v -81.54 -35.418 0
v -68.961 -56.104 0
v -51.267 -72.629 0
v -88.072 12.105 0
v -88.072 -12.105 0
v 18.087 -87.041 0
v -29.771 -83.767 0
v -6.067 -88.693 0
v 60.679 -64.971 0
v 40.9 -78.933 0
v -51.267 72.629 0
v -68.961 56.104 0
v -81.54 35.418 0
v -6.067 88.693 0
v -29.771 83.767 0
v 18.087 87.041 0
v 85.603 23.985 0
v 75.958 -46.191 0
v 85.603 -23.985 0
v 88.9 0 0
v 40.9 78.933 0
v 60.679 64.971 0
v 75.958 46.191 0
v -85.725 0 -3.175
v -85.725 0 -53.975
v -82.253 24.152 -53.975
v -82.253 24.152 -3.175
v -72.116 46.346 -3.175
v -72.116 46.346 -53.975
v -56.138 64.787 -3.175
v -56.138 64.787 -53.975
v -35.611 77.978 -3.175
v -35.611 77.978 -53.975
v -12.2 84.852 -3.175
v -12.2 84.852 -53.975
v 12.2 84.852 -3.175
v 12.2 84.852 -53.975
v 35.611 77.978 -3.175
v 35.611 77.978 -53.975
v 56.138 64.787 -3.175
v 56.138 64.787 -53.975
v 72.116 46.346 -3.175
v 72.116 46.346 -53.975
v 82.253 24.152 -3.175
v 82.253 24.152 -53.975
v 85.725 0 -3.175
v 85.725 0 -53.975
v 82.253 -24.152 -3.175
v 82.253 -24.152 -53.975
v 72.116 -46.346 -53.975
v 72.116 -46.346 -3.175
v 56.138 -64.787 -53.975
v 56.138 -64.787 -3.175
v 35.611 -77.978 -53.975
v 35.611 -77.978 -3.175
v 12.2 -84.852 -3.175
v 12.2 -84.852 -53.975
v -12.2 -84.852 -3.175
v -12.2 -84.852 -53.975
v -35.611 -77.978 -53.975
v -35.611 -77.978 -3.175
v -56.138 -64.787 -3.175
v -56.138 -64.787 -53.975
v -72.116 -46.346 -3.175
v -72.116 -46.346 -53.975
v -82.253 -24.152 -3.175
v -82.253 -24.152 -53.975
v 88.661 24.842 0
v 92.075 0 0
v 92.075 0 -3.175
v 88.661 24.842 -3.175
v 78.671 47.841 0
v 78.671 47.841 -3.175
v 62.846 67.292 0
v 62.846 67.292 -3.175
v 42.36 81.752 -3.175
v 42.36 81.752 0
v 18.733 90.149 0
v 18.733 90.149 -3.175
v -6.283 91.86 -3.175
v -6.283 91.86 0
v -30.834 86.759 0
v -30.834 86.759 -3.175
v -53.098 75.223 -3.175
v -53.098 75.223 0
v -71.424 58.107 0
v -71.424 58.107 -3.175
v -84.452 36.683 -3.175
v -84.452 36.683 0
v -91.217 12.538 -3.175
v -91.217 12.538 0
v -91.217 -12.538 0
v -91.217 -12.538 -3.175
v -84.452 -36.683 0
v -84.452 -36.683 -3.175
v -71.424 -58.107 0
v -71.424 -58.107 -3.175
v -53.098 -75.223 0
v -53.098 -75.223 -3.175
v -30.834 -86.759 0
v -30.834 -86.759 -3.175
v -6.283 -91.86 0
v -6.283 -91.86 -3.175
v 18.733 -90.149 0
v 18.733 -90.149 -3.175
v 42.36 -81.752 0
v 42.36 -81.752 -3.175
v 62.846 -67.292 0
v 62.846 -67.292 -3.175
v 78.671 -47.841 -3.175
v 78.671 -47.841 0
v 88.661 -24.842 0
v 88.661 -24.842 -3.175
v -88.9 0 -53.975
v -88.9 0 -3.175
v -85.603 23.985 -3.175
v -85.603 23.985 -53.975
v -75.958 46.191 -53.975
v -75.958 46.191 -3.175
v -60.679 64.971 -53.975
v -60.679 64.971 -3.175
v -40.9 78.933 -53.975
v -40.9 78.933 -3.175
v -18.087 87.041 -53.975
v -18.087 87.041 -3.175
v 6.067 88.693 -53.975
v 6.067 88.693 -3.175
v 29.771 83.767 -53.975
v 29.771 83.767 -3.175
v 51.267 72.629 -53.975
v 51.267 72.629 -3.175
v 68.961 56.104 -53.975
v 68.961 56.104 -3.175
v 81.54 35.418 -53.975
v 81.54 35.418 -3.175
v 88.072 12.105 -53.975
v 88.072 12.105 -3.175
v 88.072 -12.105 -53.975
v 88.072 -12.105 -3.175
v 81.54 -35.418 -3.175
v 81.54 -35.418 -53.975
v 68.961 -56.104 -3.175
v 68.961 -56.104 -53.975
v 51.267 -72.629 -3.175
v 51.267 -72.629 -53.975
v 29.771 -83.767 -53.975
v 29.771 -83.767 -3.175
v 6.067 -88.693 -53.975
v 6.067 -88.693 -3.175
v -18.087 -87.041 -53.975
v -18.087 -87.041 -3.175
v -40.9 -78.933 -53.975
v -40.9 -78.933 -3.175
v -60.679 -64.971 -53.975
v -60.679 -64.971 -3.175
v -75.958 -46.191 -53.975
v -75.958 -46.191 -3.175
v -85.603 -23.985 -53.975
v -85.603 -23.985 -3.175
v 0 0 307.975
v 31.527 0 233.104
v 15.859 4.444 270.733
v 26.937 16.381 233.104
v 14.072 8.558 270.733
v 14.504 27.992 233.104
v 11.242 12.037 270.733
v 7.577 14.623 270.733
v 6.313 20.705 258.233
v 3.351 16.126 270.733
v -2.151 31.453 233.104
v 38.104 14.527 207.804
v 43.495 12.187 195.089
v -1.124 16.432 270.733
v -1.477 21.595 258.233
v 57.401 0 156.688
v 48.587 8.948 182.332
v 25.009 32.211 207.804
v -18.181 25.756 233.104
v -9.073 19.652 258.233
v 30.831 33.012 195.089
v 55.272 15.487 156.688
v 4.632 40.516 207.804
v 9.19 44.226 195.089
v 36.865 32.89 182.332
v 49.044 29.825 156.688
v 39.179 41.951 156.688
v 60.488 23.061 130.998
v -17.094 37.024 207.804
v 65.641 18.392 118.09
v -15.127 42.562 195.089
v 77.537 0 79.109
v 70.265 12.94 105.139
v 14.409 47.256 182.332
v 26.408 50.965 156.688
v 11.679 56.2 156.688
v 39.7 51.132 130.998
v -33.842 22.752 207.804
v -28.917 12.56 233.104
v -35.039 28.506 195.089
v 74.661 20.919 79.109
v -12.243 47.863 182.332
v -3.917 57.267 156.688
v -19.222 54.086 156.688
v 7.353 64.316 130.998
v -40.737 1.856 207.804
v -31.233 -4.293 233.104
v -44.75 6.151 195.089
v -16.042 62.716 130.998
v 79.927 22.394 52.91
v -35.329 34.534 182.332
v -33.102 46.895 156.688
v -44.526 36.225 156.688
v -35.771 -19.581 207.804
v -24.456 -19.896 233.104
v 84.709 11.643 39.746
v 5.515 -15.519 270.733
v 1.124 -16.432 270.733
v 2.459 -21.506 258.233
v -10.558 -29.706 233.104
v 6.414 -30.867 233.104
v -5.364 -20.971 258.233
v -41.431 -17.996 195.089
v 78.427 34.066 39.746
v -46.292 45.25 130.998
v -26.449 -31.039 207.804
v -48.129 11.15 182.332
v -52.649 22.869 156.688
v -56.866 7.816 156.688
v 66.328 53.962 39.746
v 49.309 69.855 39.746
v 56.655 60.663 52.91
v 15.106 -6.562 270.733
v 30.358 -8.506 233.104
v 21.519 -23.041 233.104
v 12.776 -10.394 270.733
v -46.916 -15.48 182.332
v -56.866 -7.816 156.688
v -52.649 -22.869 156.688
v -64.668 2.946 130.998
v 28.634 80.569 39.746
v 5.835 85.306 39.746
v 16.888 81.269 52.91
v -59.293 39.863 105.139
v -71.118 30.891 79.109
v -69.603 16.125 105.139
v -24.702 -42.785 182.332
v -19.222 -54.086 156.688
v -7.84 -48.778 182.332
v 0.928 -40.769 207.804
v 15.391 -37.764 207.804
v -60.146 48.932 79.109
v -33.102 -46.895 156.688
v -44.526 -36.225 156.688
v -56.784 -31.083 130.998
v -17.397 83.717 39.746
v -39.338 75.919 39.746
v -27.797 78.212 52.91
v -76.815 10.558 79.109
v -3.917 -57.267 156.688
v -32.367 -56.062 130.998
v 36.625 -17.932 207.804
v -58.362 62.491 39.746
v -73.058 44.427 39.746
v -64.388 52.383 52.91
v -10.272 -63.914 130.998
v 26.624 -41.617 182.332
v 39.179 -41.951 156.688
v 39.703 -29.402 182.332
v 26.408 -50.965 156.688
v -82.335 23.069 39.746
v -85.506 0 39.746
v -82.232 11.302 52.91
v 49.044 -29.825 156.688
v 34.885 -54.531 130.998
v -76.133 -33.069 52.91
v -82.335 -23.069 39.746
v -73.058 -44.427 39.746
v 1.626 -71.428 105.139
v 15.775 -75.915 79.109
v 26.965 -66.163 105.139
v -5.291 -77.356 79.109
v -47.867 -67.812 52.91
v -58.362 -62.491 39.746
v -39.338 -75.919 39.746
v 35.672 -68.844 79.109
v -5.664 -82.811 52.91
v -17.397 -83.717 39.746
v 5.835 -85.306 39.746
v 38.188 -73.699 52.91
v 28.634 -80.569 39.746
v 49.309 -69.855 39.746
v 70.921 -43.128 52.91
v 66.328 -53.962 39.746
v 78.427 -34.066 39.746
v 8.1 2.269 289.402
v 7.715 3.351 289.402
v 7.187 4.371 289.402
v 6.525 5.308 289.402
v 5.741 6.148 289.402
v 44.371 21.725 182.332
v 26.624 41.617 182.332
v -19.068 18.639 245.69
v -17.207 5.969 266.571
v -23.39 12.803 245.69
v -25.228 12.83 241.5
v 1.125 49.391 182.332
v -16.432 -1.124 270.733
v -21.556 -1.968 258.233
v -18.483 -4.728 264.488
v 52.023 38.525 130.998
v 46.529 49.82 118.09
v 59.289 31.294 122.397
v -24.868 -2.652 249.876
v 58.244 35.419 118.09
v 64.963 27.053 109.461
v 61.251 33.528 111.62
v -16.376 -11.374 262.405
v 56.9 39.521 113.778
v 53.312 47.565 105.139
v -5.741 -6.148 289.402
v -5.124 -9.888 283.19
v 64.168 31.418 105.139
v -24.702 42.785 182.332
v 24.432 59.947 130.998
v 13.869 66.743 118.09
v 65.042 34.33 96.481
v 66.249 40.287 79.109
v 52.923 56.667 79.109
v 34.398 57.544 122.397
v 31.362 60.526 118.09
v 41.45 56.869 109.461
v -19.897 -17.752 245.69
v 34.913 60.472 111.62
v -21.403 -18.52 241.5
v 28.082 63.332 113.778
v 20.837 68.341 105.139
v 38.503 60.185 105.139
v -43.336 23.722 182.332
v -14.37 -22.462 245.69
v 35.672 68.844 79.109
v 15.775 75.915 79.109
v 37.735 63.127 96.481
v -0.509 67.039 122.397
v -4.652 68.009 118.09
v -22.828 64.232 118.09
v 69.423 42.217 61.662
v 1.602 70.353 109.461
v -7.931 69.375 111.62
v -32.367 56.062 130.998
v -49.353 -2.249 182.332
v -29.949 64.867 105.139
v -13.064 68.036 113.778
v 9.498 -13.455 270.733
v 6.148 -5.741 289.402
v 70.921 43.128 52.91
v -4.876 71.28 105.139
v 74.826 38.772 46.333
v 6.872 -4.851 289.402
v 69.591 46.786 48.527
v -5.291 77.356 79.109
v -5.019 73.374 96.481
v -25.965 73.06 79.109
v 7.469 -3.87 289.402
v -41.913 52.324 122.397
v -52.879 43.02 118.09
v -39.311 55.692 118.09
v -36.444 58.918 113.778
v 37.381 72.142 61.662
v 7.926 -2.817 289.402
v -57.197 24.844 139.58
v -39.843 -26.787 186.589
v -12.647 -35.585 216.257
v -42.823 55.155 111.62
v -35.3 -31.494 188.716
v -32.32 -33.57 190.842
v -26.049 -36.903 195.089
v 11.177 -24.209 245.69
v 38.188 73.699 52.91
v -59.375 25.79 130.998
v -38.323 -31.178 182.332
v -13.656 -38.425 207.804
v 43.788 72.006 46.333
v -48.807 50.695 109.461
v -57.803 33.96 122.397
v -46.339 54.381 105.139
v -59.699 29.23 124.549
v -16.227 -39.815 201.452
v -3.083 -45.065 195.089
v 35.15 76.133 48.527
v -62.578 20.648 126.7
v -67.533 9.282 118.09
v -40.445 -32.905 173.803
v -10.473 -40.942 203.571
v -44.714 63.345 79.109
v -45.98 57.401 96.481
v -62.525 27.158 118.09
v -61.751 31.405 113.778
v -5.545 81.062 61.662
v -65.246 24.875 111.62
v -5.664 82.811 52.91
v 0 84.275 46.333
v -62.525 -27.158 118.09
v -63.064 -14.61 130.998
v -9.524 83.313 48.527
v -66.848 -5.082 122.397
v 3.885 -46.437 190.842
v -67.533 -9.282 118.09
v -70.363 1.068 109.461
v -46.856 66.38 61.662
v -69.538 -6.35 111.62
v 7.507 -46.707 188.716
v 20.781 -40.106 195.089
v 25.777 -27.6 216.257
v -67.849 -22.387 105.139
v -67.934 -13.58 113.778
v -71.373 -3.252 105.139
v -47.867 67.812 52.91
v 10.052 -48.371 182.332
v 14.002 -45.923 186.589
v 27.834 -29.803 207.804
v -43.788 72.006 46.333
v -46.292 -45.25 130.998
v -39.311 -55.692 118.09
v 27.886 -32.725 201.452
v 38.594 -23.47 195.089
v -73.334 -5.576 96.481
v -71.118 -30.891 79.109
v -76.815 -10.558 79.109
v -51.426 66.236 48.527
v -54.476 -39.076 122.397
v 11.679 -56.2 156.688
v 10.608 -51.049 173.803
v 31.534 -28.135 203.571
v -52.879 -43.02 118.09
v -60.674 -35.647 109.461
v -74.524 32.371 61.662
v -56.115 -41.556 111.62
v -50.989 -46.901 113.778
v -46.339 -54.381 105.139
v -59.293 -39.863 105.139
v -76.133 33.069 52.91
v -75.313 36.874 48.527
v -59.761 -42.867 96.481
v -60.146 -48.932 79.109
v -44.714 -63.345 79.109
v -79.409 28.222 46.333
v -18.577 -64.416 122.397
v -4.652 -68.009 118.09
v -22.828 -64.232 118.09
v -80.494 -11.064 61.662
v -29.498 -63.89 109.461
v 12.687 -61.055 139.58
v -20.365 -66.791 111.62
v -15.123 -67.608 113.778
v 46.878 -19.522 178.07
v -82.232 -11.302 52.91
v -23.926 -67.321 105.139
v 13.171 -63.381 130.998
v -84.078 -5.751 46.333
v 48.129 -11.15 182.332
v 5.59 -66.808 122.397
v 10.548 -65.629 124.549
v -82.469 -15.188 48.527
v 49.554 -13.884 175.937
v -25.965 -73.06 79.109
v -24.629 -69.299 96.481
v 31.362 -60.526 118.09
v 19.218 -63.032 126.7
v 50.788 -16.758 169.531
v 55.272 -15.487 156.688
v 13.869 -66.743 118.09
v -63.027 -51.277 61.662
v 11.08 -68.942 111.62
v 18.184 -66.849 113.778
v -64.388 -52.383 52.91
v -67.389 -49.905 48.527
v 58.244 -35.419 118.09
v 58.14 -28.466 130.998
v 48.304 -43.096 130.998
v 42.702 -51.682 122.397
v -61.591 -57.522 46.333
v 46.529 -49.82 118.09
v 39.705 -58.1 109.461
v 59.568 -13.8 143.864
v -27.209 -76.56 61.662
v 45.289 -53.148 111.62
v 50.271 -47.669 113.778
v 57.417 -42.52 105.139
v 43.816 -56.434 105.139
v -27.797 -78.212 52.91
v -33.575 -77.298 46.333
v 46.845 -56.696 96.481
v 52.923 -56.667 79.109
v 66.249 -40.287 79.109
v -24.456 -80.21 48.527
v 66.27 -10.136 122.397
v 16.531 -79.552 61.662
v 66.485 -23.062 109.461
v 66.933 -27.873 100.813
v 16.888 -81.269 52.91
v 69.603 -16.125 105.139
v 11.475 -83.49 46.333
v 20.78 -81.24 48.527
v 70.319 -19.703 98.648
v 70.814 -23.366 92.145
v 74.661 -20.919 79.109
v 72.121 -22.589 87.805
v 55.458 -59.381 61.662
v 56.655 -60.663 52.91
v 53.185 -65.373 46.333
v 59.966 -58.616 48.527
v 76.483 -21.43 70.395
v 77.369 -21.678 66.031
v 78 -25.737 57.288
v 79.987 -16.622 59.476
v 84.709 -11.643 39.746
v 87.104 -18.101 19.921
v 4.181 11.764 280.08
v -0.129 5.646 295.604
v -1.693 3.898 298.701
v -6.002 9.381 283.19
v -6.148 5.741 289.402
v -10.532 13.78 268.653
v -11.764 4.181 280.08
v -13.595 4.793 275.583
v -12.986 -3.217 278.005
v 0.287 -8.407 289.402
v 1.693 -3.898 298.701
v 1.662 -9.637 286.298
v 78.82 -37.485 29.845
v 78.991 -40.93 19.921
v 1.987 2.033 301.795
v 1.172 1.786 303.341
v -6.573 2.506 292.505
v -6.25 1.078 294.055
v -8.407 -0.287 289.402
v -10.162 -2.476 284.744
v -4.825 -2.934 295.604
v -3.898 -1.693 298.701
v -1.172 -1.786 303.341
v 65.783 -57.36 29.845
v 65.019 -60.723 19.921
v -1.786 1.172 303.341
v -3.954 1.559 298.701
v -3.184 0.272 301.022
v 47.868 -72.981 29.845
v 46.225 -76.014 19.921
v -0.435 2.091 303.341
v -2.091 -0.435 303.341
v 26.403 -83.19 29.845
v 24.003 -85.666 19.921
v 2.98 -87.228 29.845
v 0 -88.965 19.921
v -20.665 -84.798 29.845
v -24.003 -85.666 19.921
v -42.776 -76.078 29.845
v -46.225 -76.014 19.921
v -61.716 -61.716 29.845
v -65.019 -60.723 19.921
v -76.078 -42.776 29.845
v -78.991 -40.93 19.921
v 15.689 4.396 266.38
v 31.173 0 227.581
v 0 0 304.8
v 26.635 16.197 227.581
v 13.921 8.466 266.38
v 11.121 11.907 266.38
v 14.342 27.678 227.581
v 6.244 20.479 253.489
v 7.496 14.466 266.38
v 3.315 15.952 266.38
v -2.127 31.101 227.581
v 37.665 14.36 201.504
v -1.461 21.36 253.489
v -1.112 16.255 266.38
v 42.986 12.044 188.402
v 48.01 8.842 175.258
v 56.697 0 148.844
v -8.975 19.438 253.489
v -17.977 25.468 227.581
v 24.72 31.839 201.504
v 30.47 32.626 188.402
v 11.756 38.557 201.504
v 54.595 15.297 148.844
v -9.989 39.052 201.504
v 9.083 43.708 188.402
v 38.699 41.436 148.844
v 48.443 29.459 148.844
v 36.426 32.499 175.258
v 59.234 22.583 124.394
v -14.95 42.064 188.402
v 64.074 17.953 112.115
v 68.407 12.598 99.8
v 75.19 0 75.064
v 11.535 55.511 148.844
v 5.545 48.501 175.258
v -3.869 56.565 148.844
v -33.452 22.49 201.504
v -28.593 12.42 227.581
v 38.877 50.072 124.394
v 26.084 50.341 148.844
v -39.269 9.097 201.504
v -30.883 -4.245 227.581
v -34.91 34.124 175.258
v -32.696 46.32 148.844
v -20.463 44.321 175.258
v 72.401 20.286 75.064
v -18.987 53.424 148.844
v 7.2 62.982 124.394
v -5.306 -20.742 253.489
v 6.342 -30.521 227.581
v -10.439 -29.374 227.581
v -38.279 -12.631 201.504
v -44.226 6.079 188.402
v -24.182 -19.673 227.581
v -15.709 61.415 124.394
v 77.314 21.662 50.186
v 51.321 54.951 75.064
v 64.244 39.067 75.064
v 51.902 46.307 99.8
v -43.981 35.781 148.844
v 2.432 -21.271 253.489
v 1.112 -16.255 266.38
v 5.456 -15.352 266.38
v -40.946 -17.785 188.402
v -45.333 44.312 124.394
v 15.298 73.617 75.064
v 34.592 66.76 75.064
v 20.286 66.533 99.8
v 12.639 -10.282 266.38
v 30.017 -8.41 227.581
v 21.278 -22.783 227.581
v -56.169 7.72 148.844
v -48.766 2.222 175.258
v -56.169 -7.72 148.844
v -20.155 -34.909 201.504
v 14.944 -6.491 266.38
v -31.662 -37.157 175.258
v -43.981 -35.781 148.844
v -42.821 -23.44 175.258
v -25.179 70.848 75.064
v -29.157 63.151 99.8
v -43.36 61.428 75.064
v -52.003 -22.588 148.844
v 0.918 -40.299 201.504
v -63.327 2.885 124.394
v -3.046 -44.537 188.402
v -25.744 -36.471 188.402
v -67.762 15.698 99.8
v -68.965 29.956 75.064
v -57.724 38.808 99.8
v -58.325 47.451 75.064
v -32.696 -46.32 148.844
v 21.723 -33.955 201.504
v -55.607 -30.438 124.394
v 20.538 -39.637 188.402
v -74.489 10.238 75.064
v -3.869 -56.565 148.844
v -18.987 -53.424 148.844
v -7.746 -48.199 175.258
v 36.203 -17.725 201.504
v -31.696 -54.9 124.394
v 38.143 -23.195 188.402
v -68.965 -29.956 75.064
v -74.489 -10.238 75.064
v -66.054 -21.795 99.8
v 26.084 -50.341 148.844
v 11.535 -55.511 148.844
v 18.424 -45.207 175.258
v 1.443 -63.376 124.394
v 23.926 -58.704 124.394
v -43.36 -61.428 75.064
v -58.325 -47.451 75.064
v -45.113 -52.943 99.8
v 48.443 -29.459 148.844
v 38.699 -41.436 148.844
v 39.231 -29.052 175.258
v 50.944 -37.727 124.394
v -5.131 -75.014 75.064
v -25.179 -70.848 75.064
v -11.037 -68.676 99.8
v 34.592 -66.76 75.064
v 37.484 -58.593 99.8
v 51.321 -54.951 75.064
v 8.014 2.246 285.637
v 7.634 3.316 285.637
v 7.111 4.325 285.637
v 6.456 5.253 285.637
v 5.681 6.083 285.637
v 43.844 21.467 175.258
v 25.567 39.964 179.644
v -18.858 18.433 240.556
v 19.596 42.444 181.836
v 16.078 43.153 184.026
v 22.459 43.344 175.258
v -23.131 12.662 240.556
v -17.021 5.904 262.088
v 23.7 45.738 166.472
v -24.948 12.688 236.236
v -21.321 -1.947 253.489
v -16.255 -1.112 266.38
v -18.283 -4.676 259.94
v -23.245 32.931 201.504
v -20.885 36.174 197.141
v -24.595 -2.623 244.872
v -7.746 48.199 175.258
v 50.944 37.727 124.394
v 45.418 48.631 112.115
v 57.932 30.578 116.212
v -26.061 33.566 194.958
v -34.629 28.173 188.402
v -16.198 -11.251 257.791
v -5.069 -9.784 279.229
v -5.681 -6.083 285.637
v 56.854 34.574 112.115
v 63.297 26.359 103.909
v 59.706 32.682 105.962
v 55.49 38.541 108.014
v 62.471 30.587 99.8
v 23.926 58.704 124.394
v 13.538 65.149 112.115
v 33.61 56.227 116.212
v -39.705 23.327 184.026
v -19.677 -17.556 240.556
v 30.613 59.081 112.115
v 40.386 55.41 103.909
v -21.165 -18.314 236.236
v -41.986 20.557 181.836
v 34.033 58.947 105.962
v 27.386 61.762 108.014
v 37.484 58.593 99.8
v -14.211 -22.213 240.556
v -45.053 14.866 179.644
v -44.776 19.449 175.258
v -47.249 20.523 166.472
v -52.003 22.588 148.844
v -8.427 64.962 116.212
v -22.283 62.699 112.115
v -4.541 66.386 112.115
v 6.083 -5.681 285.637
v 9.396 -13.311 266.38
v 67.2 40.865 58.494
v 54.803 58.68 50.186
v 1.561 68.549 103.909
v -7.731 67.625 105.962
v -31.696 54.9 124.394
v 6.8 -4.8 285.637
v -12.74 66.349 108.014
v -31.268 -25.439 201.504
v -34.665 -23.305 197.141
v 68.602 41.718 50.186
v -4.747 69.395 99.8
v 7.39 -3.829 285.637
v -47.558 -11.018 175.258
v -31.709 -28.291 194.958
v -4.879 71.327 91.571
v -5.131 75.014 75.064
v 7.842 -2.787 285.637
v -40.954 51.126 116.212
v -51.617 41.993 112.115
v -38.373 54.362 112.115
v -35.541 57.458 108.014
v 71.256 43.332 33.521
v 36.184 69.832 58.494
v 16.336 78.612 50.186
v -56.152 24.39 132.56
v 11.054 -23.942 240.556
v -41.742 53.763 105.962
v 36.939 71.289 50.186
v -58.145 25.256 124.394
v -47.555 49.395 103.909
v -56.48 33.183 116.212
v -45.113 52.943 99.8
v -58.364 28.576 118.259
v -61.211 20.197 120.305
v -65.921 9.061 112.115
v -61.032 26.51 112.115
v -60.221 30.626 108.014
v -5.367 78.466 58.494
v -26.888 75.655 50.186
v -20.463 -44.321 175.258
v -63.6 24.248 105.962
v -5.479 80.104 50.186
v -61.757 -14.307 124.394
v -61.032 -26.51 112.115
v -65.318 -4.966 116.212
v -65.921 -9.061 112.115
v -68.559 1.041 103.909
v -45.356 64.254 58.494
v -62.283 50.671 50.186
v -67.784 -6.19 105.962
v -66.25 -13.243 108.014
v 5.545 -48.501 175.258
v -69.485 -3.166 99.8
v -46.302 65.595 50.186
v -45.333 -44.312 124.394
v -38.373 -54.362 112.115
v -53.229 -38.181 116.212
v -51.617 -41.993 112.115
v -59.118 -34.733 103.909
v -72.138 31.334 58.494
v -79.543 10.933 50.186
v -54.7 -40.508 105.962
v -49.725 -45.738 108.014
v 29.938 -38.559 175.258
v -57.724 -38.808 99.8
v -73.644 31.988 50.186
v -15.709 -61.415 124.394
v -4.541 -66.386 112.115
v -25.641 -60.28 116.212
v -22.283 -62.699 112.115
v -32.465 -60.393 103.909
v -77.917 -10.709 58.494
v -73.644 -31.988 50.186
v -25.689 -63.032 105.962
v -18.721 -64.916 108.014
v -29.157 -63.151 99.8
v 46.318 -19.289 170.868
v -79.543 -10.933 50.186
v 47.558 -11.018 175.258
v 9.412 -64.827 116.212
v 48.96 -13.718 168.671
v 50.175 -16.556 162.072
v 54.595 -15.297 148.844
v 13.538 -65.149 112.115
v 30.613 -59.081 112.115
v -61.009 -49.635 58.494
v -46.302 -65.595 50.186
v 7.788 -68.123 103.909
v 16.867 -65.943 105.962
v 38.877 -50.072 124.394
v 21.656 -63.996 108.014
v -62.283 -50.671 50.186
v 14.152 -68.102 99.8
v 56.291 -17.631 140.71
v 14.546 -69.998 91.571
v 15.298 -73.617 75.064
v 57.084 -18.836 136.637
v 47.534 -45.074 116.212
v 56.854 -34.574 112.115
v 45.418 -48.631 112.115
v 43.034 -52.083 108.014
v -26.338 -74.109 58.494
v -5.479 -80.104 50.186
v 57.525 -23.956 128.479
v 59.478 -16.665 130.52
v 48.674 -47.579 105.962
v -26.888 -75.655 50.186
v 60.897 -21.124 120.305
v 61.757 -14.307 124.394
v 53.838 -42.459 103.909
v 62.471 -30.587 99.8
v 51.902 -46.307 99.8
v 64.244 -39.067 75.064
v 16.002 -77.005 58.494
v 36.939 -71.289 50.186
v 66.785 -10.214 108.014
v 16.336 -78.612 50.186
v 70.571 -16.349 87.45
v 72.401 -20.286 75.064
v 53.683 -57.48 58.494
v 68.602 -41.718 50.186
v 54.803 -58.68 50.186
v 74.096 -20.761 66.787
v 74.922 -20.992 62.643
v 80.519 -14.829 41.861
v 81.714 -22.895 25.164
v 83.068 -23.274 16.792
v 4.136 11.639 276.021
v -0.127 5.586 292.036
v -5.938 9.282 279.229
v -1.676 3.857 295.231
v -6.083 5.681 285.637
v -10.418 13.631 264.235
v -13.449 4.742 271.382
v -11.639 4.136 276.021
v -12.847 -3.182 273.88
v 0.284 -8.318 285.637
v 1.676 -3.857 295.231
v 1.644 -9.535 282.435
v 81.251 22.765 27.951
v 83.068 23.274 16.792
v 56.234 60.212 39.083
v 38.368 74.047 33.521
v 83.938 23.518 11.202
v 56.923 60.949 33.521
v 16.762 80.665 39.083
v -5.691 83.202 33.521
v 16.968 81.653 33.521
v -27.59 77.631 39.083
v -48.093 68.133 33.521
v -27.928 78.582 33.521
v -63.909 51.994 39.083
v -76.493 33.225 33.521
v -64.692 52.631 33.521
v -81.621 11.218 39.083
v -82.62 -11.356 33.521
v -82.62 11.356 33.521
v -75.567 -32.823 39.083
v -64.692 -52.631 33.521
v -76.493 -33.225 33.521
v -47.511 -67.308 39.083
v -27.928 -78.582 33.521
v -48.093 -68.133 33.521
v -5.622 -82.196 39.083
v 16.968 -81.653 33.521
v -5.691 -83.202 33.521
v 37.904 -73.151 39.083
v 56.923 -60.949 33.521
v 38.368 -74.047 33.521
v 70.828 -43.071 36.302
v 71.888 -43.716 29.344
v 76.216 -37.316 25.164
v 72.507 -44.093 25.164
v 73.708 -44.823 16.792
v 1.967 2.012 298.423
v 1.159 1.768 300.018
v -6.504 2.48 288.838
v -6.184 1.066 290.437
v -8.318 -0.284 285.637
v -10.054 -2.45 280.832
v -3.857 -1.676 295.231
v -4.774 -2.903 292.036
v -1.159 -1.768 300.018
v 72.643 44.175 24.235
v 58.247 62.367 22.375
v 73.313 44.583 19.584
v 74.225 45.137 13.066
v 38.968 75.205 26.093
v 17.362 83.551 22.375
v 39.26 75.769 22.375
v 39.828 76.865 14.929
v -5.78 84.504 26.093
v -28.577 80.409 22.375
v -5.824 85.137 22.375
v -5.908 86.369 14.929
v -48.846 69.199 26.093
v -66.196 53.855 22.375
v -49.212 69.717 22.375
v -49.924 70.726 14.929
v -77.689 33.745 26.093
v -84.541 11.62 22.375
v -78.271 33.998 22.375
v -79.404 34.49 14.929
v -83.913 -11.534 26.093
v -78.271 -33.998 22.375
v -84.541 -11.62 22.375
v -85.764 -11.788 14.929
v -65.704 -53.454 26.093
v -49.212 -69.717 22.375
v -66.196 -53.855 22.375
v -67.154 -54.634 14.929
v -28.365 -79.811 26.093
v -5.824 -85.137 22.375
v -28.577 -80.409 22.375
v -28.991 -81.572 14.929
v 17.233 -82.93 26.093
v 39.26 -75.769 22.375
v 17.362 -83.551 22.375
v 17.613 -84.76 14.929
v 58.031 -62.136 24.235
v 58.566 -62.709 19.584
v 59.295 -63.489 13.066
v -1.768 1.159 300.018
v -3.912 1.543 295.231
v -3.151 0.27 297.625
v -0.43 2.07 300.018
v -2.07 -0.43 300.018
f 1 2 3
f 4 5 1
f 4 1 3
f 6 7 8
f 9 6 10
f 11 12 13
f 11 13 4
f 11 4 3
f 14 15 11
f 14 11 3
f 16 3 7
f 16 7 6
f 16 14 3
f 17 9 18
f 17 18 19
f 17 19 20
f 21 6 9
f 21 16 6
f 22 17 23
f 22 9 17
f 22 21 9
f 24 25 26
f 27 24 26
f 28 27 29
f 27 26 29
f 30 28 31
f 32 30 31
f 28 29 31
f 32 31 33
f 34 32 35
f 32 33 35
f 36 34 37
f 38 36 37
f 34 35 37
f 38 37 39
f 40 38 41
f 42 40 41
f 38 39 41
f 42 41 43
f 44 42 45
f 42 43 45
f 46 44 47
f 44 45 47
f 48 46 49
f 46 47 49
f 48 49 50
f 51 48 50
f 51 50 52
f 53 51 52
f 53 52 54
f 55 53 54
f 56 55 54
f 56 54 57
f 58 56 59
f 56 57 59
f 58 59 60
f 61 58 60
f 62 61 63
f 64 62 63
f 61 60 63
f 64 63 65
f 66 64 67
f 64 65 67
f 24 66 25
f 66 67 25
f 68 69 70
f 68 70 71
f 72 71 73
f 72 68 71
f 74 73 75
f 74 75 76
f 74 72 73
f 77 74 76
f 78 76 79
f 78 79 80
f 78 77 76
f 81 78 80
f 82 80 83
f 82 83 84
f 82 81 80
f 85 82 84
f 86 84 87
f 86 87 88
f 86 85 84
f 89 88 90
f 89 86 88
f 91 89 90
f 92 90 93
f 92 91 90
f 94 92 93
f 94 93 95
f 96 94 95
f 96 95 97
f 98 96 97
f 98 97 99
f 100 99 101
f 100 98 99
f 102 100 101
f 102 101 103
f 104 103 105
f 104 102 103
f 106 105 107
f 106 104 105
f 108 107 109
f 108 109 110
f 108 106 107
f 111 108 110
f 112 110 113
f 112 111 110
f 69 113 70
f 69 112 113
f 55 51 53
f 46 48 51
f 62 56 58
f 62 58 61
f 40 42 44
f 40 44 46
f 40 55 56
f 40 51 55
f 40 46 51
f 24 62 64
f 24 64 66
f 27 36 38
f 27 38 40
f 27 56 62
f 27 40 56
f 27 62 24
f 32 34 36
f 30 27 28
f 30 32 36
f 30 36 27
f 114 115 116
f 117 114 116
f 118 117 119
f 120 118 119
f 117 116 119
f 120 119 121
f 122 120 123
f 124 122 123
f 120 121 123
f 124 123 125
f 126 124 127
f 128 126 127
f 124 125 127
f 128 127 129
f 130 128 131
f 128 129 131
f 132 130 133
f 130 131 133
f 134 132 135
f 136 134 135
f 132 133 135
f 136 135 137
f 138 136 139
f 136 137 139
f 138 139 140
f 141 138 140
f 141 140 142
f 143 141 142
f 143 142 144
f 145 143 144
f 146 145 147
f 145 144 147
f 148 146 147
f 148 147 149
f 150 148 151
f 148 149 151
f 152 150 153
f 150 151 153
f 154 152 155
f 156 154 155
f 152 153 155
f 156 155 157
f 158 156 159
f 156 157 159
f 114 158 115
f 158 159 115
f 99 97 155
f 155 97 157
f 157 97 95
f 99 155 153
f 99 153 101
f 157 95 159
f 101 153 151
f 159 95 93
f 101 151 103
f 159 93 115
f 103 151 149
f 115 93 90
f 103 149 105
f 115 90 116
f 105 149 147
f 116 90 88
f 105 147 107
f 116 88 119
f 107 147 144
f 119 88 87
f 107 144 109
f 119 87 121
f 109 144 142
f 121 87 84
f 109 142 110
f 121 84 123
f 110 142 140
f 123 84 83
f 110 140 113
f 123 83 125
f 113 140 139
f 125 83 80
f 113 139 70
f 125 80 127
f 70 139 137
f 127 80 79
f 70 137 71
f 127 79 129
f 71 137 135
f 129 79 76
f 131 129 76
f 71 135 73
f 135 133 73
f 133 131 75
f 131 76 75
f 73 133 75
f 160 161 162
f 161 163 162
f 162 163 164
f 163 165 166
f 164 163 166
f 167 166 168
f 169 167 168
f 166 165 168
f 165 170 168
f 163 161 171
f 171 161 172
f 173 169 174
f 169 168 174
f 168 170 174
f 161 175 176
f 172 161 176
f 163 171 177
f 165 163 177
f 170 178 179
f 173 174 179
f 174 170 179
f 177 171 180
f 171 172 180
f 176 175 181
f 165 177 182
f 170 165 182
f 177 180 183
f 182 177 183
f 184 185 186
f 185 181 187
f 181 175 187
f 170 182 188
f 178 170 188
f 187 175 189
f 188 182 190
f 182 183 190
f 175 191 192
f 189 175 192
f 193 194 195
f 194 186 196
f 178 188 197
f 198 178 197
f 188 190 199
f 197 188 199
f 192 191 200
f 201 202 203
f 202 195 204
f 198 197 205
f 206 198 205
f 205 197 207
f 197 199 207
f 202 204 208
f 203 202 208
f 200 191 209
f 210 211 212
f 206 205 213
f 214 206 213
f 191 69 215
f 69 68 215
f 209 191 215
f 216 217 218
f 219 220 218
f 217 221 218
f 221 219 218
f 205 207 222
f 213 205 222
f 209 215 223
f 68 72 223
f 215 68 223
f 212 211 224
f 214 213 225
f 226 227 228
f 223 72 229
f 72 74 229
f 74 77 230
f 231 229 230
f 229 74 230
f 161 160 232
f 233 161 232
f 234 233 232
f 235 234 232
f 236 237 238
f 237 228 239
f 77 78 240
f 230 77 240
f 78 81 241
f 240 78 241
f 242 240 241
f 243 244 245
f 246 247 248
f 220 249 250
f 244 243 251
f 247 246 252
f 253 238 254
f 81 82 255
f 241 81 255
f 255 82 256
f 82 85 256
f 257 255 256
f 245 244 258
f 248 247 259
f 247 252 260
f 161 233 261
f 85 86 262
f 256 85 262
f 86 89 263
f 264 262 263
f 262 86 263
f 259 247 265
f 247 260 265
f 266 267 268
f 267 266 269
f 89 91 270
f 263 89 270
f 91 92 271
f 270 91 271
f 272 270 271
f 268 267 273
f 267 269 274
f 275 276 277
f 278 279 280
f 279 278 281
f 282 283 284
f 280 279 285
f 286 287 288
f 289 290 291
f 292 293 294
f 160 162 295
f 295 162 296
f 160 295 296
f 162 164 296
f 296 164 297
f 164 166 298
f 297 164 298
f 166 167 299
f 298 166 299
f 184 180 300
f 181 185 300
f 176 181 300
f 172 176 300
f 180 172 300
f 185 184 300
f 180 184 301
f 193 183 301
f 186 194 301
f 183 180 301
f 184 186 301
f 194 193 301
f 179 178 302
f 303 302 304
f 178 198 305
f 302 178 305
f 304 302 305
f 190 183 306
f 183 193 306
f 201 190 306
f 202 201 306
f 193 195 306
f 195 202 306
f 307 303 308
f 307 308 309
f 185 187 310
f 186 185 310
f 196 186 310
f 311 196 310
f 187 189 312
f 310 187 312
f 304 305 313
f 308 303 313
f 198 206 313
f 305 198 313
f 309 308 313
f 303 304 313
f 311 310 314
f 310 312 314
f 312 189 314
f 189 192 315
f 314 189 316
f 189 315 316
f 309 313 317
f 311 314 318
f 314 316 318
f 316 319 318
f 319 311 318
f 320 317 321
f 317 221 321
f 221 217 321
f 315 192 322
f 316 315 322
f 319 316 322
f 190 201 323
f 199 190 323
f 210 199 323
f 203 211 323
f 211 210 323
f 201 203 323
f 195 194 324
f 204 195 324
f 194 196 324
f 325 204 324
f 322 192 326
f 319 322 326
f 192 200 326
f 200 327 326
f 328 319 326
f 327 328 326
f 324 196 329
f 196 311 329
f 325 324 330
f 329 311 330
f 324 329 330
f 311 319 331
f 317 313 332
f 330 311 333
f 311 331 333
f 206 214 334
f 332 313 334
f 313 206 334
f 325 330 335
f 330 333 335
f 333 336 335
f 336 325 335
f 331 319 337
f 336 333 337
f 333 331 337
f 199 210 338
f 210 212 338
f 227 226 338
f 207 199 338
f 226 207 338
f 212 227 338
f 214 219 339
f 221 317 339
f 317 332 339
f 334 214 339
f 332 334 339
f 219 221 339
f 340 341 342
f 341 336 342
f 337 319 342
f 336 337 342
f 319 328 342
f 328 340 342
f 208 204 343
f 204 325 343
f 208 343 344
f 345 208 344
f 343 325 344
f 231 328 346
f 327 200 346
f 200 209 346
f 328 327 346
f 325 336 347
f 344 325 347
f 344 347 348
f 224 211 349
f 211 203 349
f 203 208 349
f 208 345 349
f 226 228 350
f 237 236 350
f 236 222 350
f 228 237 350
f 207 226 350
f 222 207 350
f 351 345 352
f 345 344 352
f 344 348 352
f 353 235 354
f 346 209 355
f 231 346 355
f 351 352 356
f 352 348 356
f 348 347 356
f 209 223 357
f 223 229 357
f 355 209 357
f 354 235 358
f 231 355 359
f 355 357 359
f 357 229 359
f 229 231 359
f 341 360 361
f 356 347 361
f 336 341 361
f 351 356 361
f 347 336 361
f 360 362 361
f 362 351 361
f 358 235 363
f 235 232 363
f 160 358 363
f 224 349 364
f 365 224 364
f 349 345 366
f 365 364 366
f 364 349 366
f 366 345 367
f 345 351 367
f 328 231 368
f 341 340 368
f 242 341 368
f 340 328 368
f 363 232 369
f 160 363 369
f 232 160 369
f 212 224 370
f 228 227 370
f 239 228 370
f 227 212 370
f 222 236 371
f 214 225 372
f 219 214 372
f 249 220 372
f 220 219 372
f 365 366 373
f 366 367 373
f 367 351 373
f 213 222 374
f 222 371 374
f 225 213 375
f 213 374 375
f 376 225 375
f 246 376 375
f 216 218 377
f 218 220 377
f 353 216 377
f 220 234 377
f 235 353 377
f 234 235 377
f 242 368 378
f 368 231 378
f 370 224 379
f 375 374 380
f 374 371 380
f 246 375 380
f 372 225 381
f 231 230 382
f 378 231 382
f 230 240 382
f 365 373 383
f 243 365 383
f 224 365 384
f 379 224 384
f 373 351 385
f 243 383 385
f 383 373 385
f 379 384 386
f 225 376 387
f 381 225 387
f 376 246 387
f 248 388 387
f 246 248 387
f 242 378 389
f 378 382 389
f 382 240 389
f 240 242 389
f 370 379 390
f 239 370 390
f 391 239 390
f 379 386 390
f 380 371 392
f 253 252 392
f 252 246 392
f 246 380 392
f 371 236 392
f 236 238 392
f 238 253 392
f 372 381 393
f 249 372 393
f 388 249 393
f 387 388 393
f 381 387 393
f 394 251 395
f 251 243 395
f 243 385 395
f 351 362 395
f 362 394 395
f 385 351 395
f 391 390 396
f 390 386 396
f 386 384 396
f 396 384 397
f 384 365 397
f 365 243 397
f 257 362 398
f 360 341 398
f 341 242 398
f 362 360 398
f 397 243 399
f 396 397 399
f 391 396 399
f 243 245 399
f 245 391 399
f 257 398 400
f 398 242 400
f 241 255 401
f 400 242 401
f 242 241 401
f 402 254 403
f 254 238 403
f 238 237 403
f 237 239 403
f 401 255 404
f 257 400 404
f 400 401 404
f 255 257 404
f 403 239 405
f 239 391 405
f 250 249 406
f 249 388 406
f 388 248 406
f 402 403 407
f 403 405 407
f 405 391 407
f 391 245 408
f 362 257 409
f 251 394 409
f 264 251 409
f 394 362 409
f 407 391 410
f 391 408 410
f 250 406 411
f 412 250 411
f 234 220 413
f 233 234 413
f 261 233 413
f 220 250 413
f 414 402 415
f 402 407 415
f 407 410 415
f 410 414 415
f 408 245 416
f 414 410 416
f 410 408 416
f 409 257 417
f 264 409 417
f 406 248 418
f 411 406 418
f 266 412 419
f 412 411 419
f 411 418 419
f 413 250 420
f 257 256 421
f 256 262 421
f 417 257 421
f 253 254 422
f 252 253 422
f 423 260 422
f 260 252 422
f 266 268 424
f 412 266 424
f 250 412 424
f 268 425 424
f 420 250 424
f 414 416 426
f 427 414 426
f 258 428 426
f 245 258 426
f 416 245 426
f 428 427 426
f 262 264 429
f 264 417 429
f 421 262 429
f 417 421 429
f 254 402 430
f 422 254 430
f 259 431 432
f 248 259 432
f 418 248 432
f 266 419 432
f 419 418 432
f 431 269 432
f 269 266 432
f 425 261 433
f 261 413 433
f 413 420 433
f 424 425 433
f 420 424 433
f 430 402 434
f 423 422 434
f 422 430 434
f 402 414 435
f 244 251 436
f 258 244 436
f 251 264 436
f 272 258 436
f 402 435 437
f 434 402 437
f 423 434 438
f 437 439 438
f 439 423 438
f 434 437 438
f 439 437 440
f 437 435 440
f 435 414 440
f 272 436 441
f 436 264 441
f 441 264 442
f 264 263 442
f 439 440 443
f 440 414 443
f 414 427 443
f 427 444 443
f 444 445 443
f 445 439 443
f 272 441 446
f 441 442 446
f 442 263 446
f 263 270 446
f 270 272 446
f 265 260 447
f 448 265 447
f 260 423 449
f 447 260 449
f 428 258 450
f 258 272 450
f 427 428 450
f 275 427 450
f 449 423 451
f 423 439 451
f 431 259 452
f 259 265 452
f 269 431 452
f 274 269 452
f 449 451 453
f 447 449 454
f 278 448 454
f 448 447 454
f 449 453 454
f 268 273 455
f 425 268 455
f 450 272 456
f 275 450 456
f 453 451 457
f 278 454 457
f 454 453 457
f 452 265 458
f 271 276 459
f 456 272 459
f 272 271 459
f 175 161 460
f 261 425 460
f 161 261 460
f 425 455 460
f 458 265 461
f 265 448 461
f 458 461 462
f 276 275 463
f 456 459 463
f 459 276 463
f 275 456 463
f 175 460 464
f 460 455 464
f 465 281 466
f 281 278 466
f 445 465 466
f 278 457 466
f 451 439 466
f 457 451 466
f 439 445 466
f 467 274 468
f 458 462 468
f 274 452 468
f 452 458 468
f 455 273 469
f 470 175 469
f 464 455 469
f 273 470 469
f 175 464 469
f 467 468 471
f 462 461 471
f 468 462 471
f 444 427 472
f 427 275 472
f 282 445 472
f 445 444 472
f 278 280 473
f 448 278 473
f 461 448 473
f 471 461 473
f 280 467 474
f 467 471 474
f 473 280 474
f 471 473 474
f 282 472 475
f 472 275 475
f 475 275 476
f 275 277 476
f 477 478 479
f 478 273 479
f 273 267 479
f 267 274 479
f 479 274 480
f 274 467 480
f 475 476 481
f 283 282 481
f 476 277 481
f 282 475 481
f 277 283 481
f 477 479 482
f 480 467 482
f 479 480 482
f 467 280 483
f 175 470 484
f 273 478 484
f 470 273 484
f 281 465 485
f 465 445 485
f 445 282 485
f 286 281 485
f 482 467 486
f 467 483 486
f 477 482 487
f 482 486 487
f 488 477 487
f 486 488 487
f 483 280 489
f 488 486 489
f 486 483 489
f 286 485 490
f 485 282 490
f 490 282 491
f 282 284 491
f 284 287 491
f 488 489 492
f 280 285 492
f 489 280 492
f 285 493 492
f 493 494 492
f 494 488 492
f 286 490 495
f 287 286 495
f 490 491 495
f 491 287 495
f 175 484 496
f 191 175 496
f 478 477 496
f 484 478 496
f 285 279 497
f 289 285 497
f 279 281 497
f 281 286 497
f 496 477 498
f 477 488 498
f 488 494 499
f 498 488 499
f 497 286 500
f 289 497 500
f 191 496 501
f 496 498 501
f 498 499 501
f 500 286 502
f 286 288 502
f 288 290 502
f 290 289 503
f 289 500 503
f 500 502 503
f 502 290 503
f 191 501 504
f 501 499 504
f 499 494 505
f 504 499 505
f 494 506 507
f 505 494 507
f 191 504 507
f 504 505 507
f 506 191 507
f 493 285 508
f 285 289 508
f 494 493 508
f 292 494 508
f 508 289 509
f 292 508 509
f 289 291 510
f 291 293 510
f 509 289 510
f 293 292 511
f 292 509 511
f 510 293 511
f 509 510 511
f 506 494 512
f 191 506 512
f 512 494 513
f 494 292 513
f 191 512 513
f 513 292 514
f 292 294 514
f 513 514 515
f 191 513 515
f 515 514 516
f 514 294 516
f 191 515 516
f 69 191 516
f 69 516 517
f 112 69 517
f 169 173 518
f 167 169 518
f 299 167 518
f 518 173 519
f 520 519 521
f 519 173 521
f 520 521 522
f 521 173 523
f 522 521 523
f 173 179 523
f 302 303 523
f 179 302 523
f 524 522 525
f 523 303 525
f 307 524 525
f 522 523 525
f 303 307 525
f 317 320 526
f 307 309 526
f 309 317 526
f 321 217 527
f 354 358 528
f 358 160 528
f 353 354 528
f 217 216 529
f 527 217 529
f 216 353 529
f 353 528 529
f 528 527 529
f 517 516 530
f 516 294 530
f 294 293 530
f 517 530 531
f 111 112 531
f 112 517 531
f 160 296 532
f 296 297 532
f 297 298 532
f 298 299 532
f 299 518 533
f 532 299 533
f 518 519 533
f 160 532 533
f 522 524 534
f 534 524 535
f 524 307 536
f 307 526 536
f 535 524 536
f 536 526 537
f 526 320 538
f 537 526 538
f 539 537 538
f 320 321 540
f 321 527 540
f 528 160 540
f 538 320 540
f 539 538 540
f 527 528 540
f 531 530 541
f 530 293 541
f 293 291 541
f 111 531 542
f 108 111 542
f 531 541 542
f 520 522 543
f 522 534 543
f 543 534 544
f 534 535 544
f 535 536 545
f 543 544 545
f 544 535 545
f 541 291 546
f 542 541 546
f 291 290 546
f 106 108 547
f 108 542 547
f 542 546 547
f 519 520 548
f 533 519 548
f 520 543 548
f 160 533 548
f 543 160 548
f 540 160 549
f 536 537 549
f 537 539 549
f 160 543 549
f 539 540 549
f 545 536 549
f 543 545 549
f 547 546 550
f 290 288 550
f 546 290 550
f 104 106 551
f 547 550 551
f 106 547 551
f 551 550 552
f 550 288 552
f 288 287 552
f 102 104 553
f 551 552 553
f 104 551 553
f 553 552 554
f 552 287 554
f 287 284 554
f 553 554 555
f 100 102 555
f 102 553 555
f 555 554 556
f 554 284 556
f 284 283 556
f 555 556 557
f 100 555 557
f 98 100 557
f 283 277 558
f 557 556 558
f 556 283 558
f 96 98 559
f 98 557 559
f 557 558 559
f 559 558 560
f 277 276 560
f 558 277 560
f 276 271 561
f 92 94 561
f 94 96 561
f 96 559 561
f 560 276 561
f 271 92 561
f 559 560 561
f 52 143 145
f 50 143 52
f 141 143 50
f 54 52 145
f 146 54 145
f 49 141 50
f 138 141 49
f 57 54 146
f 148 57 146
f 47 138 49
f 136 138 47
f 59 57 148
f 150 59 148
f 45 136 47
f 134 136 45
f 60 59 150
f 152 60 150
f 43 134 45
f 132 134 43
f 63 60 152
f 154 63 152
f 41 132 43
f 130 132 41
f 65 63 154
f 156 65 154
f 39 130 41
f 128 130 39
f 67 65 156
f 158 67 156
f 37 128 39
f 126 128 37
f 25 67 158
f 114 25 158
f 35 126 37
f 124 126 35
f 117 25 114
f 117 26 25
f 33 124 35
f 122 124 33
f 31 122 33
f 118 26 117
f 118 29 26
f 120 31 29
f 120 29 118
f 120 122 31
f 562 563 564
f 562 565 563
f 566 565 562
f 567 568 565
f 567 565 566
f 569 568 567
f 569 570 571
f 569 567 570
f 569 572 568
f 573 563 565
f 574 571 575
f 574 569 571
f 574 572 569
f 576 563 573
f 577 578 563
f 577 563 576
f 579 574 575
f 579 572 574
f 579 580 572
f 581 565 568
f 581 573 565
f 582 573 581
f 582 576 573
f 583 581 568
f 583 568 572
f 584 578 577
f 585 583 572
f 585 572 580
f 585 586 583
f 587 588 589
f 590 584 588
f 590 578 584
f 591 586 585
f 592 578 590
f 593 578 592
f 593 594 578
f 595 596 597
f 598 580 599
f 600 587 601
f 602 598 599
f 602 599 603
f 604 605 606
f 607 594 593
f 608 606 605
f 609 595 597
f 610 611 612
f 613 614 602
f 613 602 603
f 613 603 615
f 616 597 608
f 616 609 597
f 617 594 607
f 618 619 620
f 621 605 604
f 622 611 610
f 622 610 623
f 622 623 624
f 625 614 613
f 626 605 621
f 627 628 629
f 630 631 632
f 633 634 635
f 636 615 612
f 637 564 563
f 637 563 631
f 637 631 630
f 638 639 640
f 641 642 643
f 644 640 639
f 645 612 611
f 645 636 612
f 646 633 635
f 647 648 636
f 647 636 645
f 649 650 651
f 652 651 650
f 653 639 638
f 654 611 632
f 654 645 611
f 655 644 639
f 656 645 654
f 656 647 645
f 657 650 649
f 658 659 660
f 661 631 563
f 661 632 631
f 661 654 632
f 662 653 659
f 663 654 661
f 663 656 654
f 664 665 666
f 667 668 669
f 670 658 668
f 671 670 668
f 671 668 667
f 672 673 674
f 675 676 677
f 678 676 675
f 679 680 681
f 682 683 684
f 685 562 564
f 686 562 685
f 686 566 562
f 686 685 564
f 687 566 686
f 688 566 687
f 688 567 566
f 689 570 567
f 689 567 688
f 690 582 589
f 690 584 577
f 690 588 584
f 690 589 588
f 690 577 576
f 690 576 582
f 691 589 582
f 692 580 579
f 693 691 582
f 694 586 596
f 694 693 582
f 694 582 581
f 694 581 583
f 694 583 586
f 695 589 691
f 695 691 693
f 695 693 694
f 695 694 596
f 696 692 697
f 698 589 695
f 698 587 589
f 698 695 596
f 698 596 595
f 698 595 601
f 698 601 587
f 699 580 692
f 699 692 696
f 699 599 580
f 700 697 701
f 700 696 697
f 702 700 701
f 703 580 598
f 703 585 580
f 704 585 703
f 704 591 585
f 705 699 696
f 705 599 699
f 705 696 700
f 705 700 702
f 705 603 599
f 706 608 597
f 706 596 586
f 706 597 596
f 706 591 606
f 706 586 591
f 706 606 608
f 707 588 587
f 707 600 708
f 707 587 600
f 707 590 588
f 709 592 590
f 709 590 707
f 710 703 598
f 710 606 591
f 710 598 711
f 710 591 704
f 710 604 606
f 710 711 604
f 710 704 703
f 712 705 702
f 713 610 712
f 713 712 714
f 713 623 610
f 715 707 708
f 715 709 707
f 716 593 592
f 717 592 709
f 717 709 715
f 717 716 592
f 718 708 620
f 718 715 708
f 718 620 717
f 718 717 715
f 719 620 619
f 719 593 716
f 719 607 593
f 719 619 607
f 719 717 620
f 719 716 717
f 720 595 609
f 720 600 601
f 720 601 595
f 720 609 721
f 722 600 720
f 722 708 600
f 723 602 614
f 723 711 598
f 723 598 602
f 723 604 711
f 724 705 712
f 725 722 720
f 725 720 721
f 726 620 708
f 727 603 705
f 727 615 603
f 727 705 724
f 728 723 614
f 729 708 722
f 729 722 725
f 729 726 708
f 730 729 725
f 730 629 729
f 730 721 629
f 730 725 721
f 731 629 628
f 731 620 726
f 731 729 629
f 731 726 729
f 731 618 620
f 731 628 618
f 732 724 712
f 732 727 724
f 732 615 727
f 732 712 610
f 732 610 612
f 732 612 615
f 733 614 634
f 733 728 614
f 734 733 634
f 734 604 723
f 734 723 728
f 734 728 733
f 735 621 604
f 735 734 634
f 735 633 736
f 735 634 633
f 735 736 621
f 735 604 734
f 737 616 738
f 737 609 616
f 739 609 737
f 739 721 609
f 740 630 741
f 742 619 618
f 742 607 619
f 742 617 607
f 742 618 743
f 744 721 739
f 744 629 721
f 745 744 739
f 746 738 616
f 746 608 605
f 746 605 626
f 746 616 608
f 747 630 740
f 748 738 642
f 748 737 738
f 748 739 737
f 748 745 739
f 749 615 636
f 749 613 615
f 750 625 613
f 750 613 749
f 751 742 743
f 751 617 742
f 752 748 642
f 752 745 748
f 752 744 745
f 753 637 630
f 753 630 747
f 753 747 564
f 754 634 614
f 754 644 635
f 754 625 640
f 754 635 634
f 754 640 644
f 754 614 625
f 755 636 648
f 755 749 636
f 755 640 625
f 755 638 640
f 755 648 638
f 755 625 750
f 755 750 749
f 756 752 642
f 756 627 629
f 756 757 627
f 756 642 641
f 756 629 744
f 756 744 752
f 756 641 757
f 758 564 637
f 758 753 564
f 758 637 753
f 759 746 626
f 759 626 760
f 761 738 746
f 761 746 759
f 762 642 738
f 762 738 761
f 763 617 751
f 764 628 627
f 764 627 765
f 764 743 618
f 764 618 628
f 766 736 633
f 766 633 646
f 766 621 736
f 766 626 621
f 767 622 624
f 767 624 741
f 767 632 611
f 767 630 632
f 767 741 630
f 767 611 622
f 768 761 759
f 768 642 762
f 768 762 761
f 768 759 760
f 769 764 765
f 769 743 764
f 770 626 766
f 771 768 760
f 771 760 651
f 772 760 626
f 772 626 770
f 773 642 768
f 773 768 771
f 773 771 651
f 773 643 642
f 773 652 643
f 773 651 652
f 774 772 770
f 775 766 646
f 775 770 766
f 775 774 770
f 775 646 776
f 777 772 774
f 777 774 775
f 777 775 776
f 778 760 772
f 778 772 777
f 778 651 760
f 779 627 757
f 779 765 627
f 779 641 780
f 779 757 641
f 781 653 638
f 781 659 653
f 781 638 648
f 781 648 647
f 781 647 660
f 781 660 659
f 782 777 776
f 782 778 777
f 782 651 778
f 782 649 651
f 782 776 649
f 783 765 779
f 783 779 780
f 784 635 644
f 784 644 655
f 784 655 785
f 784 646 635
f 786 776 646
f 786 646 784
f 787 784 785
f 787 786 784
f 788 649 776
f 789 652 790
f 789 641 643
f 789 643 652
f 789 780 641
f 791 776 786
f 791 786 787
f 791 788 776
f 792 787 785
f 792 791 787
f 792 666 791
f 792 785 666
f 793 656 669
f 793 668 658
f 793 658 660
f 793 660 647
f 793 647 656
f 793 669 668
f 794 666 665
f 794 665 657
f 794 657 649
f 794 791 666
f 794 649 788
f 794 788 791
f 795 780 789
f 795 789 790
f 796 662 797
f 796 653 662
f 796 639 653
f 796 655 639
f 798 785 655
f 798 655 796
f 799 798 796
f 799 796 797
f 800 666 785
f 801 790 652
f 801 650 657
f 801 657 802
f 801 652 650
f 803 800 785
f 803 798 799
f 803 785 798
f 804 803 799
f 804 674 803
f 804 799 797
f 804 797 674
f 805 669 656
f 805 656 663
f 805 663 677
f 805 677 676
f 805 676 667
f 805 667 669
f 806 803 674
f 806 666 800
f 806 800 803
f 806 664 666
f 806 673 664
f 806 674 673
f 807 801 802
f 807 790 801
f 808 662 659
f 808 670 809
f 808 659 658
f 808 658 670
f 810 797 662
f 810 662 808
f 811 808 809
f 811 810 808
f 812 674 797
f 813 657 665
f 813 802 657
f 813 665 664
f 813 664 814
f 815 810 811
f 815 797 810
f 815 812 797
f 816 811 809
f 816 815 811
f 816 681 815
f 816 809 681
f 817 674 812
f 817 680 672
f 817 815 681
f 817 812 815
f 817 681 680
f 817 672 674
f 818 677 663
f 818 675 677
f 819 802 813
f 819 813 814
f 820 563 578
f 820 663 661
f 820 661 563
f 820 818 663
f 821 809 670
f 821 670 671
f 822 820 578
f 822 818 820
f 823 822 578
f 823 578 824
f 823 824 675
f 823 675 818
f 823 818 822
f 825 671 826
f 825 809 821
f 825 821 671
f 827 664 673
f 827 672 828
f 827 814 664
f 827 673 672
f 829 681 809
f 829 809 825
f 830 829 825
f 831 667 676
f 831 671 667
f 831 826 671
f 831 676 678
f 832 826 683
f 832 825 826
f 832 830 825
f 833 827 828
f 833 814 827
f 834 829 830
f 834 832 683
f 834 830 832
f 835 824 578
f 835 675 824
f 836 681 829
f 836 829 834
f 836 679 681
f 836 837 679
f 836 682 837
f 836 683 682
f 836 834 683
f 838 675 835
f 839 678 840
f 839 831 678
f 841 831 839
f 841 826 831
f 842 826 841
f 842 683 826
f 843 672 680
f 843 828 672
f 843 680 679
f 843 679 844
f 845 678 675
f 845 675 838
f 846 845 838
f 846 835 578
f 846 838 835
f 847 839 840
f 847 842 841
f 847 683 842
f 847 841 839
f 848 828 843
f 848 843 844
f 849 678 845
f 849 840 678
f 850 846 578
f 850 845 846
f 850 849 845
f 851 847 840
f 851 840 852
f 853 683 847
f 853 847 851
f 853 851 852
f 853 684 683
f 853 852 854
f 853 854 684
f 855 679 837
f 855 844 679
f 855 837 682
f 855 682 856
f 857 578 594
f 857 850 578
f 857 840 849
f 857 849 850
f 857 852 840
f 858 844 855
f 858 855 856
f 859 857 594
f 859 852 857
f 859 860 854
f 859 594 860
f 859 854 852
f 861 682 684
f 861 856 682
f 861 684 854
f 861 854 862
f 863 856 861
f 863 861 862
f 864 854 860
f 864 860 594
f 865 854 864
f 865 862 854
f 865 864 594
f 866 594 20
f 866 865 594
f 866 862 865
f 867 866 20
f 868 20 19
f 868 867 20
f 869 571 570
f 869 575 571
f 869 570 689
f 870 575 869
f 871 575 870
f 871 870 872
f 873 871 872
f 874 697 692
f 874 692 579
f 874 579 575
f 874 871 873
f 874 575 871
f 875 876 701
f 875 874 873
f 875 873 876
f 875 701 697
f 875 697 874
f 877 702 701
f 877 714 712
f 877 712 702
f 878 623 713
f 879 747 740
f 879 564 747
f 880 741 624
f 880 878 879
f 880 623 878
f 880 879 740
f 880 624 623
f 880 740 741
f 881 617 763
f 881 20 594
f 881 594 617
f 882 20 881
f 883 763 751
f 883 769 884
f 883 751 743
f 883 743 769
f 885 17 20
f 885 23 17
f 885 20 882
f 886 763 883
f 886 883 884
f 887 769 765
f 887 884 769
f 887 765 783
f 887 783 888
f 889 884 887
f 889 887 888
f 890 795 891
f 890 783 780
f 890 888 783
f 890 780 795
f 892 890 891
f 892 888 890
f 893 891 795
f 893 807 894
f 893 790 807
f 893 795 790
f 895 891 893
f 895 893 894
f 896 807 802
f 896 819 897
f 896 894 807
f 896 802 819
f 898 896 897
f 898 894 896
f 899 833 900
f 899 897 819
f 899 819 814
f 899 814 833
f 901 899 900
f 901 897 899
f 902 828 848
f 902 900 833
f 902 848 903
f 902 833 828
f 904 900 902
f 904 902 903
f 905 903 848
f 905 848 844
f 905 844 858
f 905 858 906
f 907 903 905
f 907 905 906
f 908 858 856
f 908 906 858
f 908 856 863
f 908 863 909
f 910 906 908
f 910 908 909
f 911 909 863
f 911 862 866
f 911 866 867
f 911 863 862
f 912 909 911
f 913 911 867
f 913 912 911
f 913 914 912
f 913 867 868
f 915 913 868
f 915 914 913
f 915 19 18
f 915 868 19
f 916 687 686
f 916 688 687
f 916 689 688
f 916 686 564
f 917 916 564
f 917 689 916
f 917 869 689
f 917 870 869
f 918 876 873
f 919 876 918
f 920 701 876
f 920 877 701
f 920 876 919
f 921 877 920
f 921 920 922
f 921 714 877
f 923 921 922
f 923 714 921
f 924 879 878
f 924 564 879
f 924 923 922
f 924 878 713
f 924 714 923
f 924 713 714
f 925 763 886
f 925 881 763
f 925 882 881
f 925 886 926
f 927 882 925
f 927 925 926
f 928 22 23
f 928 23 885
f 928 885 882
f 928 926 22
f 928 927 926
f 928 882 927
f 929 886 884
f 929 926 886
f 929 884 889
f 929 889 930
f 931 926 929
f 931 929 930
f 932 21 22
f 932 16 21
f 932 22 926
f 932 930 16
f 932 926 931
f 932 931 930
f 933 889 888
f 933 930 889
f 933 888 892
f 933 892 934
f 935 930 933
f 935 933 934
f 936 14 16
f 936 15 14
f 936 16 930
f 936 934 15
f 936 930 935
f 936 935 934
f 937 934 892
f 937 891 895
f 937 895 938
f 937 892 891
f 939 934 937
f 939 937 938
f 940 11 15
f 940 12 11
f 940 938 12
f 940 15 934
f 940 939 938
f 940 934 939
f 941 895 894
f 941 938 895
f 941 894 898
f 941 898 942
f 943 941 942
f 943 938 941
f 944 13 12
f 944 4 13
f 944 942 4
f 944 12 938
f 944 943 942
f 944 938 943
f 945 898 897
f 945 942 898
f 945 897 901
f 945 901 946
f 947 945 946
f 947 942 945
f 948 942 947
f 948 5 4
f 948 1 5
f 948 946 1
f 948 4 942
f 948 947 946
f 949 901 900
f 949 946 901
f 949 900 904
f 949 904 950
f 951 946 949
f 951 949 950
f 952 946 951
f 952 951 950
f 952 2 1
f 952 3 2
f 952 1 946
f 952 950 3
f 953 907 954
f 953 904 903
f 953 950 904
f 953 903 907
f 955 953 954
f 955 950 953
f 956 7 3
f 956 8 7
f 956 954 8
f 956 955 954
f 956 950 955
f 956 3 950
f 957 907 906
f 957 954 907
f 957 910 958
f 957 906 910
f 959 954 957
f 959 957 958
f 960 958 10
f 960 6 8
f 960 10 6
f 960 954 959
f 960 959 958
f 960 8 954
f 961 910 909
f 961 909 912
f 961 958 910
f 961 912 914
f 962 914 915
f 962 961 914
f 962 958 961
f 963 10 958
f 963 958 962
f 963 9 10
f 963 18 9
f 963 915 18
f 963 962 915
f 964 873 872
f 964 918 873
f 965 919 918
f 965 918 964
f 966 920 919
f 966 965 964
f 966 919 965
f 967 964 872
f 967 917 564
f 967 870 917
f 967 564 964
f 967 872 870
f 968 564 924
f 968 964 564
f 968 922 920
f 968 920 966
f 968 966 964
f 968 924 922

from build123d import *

# Parameters (mm, degrees)
SKETCH1_R           = 92.075
BOSS_EXTRUDE1_DEPTH = 3.175
SKETCH2_R           = 88.9
BOSS_EXTRUDE2_DEPTH = 50.8
SKETCH3_R           = 85.725
CUT_EXTRUDE1_DEPTH  = 50.8


with BuildPart() as part:
    # Sketch1 → Boss-Extrude1 (new body)
    with BuildSketch(Plane.XY):
        Circle(SKETCH1_R)
    extrude(amount=-BOSS_EXTRUDE1_DEPTH)

    # Sketch2 → Boss-Extrude2 (add)
    with BuildSketch(Plane(origin=(0, 0, -3.175), x_dir=(-1, 0, 0), z_dir=(0, 0, -1))):
        Circle(SKETCH2_R)
    extrude(amount=BOSS_EXTRUDE2_DEPTH)

    # Sketch3 → Cut-Extrude1 (cut)
    with BuildSketch(Plane(origin=(0, 0, -53.975), x_dir=(-1, 0, 0), z_dir=(0, 0, -1))):
        Circle(SKETCH3_R)
    extrude(amount=-CUT_EXTRUDE1_DEPTH, mode=Mode.SUBTRACT)

    # Sketch4 → Revolve1 (revolve)
    with BuildSketch(Plane(origin=(0, 0, 0), x_dir=(1, 0, 0), z_dir=(0, 1, 0))):
        with BuildLine():
            add(Edge.make_bspline(
                [(0, -304.8), (65.277515516, -157.994281663), (88.9, 0)],
                knots=[0, 0, 0, 1, 1, 1], degree=2))
            Line((88.9, 0), (92.075, 0))
            add(Edge.make_bspline(
                [(0, -307.975), (68.538261276, -160.143028223), (92.075, 0)],
                knots=[0, 0, 0, 1, 1, 1], degree=2))
            Line((0, -307.975), (0, -304.8))
        make_face()
    revolve(axis=Axis((0, 0, 0), (0, 0, 1)))


solid = part.part
